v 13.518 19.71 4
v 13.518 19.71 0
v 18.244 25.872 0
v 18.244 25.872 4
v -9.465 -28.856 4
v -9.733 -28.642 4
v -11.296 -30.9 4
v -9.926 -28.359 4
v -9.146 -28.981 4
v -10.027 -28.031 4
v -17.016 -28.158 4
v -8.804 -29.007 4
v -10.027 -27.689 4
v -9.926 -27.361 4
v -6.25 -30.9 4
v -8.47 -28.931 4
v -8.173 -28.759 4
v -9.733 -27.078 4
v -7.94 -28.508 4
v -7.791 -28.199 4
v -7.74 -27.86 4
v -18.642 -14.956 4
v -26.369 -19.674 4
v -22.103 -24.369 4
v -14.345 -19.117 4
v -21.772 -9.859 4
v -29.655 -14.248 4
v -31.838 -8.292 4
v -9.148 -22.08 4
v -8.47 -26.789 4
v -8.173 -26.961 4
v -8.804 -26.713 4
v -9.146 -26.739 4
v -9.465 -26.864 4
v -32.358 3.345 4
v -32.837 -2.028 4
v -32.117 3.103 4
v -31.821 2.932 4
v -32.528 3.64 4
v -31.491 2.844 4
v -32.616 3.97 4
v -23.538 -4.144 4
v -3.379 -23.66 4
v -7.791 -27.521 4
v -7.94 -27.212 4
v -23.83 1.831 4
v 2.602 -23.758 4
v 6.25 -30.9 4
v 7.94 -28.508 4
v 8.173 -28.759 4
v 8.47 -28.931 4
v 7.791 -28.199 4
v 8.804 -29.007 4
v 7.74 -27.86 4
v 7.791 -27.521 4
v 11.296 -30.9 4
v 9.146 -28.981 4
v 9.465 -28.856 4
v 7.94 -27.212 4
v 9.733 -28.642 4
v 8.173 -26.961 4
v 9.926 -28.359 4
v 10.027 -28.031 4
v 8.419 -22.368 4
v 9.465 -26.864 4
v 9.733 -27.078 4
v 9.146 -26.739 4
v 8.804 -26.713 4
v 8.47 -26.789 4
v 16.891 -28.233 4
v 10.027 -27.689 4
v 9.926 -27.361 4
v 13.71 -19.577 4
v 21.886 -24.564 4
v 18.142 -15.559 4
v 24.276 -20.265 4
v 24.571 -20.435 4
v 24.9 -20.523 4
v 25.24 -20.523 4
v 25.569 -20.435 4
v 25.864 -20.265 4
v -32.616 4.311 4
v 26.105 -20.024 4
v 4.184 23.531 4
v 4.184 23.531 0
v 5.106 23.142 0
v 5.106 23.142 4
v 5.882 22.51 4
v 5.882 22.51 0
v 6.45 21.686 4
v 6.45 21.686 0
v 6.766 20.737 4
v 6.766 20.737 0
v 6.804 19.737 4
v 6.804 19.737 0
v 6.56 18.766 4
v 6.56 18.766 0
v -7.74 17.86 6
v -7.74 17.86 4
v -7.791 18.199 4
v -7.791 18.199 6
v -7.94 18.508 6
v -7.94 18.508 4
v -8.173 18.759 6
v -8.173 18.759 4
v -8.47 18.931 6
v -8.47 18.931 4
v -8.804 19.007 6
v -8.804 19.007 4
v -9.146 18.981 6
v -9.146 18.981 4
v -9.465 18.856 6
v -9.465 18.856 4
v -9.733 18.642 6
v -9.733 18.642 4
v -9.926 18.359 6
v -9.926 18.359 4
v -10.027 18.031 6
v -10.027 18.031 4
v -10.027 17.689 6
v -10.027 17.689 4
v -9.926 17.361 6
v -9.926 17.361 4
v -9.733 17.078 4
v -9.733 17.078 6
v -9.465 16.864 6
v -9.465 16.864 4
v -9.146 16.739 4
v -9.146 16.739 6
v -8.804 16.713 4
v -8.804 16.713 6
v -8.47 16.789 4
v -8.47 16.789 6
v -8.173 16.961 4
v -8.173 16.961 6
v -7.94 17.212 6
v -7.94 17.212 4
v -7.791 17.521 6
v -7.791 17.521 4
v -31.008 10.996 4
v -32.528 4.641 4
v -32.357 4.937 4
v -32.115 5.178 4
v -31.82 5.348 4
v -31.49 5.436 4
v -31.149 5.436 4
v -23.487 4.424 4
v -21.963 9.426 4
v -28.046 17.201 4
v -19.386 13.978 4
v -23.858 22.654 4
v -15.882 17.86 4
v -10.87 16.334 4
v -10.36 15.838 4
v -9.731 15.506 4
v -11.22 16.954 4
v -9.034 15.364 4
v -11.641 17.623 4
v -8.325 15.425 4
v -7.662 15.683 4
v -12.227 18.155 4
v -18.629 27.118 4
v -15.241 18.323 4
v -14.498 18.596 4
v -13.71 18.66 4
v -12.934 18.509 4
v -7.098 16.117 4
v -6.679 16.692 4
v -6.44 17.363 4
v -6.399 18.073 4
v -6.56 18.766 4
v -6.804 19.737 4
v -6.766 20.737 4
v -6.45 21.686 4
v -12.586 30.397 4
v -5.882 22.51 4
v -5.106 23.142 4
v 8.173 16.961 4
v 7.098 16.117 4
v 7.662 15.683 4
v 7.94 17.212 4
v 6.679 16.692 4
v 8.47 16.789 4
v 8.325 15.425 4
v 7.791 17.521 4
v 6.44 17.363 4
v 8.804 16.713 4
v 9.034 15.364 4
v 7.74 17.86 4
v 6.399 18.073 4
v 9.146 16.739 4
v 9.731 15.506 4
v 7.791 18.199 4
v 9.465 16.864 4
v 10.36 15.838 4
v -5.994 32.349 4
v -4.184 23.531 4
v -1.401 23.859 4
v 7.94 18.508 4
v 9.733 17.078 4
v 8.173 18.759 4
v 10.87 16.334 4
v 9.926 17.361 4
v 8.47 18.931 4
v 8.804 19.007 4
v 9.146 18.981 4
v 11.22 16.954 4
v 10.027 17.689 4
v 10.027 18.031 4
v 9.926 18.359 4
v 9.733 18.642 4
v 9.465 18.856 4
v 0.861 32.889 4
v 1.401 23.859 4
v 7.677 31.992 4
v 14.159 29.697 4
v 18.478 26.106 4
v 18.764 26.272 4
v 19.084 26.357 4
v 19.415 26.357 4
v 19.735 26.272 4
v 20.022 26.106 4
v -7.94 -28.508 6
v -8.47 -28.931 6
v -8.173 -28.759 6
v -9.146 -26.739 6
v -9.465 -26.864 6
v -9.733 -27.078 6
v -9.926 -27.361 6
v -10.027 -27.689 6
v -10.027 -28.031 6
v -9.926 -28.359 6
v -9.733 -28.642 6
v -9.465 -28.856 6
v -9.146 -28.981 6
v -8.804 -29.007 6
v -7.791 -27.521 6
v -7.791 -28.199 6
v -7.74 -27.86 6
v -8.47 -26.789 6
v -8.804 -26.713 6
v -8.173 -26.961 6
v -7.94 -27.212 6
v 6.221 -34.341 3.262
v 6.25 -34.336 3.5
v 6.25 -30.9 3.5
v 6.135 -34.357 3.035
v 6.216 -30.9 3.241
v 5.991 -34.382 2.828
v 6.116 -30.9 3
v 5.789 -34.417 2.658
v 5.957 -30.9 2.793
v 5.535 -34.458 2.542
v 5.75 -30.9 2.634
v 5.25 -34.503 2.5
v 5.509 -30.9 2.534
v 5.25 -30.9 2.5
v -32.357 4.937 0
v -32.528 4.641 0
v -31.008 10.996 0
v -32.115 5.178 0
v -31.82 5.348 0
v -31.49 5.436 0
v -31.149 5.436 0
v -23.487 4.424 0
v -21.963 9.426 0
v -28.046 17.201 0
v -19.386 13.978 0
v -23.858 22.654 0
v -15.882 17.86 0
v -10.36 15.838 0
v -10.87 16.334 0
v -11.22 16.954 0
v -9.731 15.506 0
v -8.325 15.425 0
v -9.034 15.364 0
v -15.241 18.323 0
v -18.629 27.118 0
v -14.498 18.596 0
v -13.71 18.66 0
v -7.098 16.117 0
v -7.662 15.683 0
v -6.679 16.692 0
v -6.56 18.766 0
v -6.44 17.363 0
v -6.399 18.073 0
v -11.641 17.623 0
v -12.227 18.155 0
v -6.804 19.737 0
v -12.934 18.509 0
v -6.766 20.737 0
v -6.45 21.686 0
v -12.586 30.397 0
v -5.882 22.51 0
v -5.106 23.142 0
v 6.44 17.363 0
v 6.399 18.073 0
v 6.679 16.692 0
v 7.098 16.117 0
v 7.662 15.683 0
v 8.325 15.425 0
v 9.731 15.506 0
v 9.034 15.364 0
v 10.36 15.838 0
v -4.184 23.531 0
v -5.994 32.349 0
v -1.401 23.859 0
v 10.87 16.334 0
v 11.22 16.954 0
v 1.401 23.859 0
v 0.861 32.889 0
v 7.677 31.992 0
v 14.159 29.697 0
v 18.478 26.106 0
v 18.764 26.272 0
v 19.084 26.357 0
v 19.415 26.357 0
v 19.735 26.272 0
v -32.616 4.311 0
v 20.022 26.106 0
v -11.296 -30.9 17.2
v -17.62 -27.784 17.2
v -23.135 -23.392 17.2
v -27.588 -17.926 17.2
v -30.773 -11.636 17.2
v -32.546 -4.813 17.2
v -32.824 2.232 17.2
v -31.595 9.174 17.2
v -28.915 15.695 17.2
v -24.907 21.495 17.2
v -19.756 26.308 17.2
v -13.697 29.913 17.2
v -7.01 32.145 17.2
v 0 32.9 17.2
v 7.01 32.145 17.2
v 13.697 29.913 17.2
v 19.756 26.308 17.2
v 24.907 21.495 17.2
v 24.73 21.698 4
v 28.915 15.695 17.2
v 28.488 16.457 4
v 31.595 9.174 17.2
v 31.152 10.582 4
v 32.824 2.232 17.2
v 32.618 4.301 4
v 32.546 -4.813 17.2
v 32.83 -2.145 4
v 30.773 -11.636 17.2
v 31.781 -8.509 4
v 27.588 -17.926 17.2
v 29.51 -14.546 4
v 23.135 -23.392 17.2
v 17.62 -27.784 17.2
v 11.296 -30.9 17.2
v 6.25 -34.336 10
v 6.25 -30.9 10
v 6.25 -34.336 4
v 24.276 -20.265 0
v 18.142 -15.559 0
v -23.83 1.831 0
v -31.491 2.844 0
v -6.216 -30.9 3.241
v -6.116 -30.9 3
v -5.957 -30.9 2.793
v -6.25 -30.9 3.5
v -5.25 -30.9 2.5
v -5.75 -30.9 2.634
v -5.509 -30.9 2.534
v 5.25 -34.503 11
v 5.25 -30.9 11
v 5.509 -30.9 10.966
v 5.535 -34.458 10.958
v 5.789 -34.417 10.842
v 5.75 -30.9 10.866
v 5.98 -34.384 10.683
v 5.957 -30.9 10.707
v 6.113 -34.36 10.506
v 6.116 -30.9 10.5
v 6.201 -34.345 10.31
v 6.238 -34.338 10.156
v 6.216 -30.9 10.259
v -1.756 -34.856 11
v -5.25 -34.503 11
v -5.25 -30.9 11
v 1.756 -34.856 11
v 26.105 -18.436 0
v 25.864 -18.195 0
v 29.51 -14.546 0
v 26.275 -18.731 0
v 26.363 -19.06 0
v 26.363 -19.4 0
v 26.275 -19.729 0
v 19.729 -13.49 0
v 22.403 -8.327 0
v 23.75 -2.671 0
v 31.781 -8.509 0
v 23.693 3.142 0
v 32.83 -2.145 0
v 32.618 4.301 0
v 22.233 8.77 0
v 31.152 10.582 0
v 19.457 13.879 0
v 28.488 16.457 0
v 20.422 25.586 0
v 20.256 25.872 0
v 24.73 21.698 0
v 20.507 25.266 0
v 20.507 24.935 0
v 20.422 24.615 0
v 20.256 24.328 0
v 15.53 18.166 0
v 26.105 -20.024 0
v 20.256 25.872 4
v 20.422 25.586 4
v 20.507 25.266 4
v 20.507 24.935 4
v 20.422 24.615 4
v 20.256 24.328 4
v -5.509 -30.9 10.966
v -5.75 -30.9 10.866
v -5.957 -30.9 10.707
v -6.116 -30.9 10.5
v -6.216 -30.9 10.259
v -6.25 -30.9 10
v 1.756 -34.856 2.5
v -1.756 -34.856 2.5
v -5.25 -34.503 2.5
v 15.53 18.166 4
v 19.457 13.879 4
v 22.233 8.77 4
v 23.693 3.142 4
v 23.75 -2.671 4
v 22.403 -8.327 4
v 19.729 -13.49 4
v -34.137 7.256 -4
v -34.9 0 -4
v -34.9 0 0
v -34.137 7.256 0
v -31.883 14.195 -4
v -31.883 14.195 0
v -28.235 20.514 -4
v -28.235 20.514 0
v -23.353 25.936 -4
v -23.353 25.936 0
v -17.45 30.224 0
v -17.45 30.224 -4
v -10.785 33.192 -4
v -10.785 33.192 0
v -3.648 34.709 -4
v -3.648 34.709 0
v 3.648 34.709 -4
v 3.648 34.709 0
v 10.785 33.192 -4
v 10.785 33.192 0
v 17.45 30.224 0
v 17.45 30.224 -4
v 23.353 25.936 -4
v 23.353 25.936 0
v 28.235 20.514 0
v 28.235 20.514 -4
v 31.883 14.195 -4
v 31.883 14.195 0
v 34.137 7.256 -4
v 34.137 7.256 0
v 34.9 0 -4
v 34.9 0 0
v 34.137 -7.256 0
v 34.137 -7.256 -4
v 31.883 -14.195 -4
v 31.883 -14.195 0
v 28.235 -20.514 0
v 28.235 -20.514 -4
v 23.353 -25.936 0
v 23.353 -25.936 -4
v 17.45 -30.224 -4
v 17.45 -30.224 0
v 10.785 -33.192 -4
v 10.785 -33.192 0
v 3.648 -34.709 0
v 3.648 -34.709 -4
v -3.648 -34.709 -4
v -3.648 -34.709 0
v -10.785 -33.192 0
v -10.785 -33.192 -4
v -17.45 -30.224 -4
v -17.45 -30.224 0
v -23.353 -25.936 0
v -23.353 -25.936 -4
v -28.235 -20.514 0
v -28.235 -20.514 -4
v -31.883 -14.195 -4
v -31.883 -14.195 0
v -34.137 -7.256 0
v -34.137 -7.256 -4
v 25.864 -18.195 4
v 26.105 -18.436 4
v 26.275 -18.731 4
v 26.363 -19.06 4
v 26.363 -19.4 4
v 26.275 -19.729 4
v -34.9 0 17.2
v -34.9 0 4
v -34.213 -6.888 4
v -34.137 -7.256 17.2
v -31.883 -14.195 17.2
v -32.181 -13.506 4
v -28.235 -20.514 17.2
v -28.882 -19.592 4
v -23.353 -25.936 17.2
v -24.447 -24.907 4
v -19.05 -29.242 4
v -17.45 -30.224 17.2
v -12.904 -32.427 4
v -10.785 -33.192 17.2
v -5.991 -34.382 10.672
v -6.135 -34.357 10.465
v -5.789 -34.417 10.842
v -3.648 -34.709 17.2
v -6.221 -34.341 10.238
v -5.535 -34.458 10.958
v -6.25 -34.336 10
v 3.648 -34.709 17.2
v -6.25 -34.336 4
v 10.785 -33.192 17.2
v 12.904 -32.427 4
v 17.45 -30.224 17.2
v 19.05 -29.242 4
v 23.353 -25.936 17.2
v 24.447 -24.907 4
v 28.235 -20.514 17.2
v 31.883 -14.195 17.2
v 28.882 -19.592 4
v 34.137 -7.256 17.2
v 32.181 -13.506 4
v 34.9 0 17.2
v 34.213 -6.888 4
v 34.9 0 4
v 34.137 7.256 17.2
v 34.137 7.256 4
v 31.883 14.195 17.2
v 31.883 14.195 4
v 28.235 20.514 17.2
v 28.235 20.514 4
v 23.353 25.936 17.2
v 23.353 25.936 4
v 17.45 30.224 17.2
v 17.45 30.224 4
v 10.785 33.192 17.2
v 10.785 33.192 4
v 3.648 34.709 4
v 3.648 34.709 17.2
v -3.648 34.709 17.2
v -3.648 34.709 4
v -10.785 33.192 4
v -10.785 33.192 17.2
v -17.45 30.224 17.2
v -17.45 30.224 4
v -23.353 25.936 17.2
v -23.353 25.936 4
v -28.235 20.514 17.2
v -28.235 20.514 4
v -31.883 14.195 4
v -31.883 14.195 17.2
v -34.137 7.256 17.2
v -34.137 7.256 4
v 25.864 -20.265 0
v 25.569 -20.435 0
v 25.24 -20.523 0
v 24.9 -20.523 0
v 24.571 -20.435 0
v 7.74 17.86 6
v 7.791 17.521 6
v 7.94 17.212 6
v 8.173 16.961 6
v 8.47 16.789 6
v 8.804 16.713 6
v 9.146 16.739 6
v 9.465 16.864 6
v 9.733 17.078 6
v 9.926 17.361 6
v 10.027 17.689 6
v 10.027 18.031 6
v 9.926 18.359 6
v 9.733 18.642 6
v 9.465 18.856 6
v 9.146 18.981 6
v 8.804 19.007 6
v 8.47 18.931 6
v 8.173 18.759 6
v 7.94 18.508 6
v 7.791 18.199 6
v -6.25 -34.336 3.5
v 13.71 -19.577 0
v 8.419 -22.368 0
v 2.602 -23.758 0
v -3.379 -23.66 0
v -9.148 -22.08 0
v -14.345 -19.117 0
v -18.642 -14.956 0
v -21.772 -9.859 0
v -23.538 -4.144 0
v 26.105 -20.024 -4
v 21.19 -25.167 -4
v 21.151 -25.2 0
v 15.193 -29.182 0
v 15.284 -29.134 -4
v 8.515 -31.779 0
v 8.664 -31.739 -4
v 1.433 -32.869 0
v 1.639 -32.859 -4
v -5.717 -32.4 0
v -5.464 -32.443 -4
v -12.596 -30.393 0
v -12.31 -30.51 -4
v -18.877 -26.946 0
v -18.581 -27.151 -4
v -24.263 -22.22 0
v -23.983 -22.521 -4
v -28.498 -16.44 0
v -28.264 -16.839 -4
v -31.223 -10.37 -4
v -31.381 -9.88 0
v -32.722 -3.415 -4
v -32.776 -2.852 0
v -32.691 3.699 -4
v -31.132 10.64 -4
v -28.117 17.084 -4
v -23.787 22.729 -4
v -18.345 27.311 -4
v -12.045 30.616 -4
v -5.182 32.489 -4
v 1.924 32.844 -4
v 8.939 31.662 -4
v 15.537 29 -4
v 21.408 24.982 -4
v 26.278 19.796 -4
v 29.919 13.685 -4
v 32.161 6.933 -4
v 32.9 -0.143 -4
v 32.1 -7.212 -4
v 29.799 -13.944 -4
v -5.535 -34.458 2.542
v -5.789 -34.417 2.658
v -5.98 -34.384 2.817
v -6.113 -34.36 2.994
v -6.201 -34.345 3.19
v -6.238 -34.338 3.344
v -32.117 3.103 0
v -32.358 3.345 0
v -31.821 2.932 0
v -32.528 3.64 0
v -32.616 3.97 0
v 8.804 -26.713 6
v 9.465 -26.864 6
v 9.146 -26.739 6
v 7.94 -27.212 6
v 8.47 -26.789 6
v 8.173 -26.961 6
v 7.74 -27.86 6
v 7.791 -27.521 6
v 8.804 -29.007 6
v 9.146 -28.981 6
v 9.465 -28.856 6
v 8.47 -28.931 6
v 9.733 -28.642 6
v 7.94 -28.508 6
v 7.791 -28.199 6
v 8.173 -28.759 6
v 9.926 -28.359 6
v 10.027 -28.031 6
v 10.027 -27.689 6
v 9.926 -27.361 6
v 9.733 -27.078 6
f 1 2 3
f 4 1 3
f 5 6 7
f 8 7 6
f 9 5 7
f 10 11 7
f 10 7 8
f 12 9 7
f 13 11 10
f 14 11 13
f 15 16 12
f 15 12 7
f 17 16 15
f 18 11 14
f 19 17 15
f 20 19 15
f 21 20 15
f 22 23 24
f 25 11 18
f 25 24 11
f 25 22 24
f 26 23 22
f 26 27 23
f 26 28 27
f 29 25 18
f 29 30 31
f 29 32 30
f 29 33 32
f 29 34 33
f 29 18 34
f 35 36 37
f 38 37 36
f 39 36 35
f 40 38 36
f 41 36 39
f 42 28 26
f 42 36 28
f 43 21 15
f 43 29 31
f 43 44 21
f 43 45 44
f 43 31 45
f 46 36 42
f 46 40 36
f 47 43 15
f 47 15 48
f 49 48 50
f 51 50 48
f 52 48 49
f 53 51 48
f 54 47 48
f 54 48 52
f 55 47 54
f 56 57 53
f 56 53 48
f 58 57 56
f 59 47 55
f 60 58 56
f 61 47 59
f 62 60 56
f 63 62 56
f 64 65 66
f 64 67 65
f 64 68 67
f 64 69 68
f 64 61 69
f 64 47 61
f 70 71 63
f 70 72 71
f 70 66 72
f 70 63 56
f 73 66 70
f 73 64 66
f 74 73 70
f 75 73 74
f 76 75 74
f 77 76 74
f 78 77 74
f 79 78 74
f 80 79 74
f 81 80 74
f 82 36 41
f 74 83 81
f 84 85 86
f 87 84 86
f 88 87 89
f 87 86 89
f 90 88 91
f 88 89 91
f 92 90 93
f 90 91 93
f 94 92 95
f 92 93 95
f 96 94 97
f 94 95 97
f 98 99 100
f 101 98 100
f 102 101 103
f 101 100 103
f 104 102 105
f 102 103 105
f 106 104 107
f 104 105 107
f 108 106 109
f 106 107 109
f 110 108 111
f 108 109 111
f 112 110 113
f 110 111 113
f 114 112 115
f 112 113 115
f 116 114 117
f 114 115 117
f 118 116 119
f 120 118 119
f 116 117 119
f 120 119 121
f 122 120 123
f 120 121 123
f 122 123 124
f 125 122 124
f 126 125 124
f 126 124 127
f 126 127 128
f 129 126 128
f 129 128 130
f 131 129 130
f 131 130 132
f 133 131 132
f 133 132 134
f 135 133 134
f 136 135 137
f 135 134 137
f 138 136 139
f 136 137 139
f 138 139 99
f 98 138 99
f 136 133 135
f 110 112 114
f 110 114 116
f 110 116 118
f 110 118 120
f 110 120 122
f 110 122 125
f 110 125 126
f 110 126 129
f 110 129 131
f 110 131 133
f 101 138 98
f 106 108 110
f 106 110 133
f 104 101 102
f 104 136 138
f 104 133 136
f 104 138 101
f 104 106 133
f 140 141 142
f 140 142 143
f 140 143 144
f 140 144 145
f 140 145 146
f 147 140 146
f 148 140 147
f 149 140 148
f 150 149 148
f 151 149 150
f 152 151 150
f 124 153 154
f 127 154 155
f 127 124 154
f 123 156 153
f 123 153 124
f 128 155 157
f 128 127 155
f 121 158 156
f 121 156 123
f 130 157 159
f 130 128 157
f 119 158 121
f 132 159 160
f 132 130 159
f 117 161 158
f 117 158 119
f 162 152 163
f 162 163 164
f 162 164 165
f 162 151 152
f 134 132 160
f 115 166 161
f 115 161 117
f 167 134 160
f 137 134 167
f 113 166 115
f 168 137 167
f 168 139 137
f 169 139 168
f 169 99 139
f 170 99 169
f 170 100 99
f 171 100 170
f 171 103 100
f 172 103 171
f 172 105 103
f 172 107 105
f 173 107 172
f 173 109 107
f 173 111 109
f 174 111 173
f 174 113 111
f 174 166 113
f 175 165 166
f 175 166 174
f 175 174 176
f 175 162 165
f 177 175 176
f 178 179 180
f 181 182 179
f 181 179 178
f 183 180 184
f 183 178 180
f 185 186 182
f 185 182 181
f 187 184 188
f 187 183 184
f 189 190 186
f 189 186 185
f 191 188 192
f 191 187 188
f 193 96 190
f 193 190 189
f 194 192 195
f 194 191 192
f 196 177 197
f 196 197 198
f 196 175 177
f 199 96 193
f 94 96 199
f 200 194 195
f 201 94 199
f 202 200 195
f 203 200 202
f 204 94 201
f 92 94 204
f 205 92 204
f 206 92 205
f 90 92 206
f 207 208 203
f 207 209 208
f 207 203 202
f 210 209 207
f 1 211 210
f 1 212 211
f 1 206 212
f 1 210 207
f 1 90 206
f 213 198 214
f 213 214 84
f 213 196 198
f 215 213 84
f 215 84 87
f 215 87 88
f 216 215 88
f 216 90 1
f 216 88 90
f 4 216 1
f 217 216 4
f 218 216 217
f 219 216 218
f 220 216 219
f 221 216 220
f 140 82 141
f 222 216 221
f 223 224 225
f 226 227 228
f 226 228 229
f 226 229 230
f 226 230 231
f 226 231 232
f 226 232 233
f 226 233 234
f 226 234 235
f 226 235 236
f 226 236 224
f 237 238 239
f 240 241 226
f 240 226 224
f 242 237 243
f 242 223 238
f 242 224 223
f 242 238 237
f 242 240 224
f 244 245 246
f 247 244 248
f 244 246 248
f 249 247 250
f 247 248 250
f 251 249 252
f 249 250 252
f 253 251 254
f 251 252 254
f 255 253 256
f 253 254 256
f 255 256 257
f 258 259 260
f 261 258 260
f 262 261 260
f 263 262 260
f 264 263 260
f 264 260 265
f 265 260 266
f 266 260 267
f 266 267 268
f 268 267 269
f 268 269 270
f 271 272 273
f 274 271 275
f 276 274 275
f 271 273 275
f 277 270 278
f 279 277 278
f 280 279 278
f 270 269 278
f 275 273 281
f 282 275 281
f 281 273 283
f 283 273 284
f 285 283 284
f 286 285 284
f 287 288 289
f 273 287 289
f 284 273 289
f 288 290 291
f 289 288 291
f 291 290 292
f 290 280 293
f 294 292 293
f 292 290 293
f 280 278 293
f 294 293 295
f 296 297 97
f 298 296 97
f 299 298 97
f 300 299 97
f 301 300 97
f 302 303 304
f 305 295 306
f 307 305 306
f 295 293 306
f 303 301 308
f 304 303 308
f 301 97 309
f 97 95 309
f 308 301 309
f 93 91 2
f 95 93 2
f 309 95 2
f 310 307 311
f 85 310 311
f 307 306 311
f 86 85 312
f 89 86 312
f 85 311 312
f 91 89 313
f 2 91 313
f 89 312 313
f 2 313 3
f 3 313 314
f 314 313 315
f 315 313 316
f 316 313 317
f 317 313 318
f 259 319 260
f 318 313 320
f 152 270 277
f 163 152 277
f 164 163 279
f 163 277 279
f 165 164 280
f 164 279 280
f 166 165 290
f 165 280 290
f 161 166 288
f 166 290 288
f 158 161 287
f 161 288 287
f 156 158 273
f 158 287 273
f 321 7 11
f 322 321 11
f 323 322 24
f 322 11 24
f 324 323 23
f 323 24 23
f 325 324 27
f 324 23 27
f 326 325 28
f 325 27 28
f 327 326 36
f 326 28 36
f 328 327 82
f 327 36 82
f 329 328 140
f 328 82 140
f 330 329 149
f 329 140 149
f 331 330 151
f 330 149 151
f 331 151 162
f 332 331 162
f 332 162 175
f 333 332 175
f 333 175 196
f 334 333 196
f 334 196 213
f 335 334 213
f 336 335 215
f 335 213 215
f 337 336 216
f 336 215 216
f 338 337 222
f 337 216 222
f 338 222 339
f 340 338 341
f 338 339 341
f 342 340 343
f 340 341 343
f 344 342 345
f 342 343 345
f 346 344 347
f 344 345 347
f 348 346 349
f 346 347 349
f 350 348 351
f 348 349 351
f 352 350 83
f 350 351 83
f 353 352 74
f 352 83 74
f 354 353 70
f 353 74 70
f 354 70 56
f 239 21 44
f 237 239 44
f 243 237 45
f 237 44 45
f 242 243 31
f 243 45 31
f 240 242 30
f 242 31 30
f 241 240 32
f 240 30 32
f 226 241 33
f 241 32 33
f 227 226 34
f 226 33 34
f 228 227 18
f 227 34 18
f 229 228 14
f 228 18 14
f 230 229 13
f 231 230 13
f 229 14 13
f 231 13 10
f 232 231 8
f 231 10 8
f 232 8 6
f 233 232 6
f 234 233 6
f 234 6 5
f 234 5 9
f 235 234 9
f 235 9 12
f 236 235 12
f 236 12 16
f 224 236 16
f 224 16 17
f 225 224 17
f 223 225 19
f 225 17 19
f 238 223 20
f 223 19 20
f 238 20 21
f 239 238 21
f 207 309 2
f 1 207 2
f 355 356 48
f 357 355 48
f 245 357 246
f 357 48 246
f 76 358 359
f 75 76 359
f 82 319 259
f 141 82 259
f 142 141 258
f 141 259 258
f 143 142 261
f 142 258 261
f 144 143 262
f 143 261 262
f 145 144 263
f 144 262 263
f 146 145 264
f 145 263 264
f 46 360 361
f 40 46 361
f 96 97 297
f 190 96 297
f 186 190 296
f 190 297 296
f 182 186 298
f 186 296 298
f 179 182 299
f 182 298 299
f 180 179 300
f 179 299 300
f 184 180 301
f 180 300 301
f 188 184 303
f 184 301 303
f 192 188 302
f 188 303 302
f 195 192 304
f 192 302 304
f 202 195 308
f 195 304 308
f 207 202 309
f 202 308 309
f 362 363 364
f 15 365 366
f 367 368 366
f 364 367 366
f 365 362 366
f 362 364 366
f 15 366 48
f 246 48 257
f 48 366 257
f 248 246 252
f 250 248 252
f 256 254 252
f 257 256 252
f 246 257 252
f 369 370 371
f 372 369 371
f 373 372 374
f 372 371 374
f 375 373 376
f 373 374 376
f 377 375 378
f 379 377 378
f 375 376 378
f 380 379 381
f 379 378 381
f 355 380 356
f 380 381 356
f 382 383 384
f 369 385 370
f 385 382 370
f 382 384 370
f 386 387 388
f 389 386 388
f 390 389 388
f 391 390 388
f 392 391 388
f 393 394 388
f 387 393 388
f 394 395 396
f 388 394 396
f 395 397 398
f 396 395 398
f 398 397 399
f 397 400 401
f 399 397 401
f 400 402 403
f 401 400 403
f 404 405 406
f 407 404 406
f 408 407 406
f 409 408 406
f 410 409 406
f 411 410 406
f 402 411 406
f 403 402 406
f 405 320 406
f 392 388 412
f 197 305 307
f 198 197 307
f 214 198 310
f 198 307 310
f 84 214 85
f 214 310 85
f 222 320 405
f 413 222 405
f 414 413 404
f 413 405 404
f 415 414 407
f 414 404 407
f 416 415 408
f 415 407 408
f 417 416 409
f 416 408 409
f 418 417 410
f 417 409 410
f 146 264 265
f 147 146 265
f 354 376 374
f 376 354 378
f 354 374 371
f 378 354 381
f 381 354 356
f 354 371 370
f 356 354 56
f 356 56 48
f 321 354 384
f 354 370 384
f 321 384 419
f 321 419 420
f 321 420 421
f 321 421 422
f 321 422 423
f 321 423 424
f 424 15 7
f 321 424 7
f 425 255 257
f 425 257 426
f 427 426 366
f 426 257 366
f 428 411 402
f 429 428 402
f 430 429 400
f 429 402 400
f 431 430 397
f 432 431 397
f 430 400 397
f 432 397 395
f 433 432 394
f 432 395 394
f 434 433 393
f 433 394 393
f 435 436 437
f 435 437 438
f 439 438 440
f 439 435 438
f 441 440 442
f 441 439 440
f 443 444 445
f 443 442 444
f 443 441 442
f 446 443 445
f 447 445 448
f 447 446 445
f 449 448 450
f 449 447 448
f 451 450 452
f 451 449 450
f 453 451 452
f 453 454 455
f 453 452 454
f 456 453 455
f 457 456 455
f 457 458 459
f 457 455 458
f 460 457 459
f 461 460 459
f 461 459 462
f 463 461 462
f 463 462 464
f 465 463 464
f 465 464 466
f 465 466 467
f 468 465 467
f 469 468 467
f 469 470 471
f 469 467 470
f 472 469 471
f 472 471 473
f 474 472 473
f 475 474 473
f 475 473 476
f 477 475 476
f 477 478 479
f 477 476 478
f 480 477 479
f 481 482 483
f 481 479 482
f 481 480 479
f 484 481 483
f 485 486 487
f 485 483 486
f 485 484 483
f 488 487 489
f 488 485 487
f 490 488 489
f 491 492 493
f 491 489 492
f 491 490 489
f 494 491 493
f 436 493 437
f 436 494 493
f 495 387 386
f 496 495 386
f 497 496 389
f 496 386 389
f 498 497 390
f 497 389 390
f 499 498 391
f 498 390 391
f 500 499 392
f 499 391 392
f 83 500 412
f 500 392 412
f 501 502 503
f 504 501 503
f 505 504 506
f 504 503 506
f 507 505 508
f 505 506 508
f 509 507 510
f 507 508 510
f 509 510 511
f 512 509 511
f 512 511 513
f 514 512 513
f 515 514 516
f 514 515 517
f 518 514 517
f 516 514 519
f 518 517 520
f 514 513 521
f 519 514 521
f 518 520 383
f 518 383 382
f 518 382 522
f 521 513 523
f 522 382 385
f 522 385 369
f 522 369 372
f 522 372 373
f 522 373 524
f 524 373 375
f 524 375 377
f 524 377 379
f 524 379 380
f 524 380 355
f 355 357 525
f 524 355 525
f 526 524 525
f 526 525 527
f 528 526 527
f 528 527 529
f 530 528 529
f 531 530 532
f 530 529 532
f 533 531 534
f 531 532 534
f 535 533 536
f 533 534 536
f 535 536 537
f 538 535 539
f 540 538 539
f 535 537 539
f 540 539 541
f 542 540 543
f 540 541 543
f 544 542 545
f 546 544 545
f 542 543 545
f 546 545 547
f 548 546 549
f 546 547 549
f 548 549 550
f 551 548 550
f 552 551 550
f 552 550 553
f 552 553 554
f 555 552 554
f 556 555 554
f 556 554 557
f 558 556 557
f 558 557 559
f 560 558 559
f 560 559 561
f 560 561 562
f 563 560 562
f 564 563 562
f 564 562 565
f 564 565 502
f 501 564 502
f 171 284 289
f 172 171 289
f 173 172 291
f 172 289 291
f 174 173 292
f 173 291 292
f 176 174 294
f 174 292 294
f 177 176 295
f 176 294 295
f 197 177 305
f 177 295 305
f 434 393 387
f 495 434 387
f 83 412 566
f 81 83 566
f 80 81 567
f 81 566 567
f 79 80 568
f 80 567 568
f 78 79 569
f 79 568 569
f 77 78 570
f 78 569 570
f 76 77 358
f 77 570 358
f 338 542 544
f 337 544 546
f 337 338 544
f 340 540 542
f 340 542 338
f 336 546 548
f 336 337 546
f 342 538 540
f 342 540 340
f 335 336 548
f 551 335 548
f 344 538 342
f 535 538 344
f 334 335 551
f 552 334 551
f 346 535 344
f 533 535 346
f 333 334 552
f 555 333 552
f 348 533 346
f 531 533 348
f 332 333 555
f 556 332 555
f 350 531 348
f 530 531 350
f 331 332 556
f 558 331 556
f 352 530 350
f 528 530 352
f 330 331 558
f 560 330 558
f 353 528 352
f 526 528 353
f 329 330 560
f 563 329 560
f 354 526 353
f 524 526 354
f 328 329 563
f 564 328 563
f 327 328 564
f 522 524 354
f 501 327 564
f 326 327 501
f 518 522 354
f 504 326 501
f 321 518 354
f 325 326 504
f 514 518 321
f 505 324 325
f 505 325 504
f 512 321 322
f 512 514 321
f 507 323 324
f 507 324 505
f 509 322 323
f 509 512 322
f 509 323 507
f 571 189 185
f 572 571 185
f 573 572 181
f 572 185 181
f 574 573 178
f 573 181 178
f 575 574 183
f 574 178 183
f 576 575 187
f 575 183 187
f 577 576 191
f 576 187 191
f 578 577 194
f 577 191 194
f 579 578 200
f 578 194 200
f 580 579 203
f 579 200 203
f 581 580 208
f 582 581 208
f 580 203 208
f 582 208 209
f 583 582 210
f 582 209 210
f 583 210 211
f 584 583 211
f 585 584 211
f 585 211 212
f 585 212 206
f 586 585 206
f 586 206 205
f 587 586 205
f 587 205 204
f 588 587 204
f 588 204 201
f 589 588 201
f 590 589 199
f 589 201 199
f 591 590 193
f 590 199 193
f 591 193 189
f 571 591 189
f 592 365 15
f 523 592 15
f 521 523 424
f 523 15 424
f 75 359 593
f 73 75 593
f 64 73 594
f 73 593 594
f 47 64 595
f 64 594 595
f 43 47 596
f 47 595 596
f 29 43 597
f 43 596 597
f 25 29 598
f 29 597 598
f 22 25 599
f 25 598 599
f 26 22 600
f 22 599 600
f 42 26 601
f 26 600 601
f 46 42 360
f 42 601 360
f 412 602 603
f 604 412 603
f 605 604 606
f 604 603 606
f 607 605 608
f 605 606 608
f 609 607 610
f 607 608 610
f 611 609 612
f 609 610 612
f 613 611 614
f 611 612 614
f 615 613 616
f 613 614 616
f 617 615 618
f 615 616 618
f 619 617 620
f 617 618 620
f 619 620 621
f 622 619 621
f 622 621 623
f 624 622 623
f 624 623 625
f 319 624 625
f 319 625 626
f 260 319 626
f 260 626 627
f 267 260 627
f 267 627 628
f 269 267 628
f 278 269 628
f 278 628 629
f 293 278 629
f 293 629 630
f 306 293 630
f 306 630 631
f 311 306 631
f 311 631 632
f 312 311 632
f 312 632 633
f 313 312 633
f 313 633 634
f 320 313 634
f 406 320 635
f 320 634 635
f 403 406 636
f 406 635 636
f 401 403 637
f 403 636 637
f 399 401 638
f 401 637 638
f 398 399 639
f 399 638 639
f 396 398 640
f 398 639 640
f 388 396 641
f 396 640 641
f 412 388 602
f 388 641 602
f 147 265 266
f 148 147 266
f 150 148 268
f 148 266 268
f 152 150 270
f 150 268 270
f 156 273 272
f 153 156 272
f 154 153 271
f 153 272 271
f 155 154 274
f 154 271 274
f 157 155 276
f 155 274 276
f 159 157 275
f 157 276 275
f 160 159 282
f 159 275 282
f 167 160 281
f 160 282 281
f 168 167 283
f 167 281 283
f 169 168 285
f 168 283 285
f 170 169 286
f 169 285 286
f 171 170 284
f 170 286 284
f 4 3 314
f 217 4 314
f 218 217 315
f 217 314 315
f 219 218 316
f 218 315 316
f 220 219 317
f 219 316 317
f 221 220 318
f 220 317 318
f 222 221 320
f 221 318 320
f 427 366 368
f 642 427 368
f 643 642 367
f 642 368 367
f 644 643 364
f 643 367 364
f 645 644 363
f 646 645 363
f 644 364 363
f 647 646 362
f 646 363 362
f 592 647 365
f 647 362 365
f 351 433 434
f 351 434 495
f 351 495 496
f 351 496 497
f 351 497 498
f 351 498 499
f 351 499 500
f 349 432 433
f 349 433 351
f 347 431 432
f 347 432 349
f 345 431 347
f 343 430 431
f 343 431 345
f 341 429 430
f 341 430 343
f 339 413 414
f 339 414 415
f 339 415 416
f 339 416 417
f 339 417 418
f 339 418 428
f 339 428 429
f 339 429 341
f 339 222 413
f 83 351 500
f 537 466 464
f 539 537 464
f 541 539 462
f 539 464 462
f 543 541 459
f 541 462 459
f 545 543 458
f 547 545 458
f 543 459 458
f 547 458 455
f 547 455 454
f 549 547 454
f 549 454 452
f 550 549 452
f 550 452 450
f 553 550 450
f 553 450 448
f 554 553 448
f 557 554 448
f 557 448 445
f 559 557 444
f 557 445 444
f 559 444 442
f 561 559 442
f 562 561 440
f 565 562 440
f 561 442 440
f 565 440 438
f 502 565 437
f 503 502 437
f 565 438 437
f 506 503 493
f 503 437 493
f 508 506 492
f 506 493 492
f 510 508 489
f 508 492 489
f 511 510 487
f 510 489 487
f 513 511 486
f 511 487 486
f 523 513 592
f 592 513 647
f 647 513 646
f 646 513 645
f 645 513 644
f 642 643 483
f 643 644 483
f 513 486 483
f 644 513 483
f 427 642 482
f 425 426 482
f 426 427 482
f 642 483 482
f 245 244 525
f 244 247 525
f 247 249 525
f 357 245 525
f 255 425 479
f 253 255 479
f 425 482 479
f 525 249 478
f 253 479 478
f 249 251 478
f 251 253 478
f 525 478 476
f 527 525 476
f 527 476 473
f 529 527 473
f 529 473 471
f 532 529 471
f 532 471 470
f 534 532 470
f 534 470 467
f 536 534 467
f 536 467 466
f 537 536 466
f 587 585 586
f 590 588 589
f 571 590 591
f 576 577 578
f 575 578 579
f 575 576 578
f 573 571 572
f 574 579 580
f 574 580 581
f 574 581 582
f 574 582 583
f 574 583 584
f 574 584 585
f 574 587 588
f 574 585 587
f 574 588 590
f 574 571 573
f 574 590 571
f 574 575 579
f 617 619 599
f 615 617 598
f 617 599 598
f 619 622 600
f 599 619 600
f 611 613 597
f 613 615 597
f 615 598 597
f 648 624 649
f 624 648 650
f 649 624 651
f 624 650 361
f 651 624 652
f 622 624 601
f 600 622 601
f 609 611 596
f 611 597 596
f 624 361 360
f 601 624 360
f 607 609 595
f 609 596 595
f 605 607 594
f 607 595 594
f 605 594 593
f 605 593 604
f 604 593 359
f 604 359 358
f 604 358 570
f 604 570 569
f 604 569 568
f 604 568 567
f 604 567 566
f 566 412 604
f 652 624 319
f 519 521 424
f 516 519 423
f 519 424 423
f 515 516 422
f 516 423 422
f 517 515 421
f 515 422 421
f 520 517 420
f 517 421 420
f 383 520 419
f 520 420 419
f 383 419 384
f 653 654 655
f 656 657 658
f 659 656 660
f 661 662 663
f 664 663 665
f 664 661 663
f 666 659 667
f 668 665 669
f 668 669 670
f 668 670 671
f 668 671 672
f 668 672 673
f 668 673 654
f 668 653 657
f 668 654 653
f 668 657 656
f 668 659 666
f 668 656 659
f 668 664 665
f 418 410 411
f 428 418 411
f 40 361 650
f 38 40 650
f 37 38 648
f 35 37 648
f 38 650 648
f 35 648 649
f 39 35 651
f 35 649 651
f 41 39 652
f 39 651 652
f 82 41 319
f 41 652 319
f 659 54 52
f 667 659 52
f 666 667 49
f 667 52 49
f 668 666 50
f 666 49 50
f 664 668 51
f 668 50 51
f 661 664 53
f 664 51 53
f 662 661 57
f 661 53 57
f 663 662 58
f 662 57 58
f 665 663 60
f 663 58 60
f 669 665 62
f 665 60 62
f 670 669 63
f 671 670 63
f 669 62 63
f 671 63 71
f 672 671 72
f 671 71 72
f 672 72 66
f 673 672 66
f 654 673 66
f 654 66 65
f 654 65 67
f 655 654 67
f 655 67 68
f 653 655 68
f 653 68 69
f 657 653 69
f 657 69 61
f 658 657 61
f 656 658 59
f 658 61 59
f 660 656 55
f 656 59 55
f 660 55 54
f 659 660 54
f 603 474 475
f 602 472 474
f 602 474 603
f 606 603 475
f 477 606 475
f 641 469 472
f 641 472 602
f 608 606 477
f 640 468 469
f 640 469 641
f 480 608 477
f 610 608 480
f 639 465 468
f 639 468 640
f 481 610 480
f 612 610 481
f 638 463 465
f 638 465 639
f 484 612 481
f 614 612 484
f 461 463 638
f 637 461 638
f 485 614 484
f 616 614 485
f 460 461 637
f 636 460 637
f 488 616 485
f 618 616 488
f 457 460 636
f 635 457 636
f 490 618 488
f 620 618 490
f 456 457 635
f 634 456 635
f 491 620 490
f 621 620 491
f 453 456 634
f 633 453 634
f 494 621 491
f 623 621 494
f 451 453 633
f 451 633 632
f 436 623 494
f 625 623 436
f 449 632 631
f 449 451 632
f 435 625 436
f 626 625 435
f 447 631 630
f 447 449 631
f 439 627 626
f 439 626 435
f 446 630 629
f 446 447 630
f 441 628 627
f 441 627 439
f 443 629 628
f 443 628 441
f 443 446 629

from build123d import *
from build123d.topology import SkipClean

# Parameters (mm, degrees)
ESQUISSE_SUPPORT_R      = 34.9
BOSS_EXTRU_1_DEPTH      = 4
ESQUISSE6_R             = 1.15
BOSS_EXTRU_2_DEPTH      = 2
BOSS_EXTRU_3_START      = 4
ESQUISSE7_R             = 34.9
ESQUISSE7_R_2           = 32.9
BOSS_EXTRU_3_DEPTH      = 4
ESQUISSE8_R             = 34.9
BOSS_EXTRU_5_DEPTH      = 13.2
ENL_V_MAT_EXTRU_1_DEPTH = 10


with BuildPart() as part:
    # Esquisse_support → Boss.-Extru.1 (new body)
    with BuildSketch(Plane.XY):
        Circle(ESQUISSE_SUPPORT_R)
        with BuildLine():
            ThreePointArc((-6.559988321, 18.766115653), (-6.450497051, 21.686422251), (-4.183806862, 23.530953235))
            ThreePointArc((-4.183806862, 23.530953235), (0, 23.9), (4.183806862, 23.530953235))
            ThreePointArc((4.183806862, 23.530953235), (6.450497051, 21.686422251), (6.559988321, 18.766115653))
            ThreePointArc((6.559988321, 18.766115653), (7.983884347, 15.529988321), (11.220011679, 16.953884347))
            Line((11.220011679, 16.953884347), (13.517895322, 19.709807357))
            Line((13.517895322, 19.709807357), (18.243699169, 25.871764581))
            ThreePointArc((18.243699169, 25.871764581), (19.084157828, 26.35728211), (20.021764581, 26.106300831))
            ThreePointArc((20.021764581, 26.106300831), (20.50728211, 25.265842172), (20.256300831, 24.328235419))
            Line((20.256300831, 24.328235419), (15.530496983, 18.166278195))
            ThreePointArc((15.530496983, 18.166278195), (23.692512492, 3.142427693), (19.729143793, -13.489658454))
            Line((19.729143793, -13.489658454), (25.863736665, -18.195211742))
            ThreePointArc((25.863736665, -18.195211742), (26.362962372, -19.059550784), (26.104788258, -20.023736665))
            ThreePointArc((26.104788258, -20.023736665), (25.240449216, -20.522962372), (24.276263335, -20.264788258))
            Line((24.276263335, -20.264788258), (18.141670463, -15.559234969))
            ThreePointArc((18.141670463, -15.559234969), (-9.148411266, -22.079777429), (-23.829761597, 1.830973023))
            Line((-23.829761597, 1.830973023), (-31.491348477, 2.843711519))
            ThreePointArc((-31.491348477, 2.843711519), (-32.357776046, 3.344547295), (-32.616288481, 4.311348477))
            ThreePointArc((-32.616288481, 4.311348477), (-32.115452705, 5.177776046), (-31.148651523, 5.436288481))
            Line((-31.148651523, 5.436288481), (-23.487064643, 4.423549986))
            ThreePointArc((-23.487064643, 4.423549986), (-20.799295594, 11.772820511), (-15.881763126, 17.86))
            ThreePointArc((-15.881763126, 17.86), (-13.316845537, 18.611032405), (-11.220011679, 16.953884347))
            ThreePointArc((-11.220011679, 16.953884347), (-7.983884347, 15.529988321), (-6.559988321, 18.766115653))
        make_face(mode=Mode.SUBTRACT)
    extrude(amount=BOSS_EXTRU_1_DEPTH)

    # Esquisse6 → Boss.-Extru.2 (add)
    with BuildSketch(Plane.XY.offset(4)):
        with Locations((-8.89, 17.86)):
            Circle(ESQUISSE6_R)
        with Locations((-8.89, -27.86)):
            Circle(ESQUISSE6_R)
        with Locations(Location((8.89, -27.86, 0), (0, 0, 180))):
            Circle(ESQUISSE6_R)
        with Locations(Location((8.89, 17.86, 0), (0, 0, 180))):
            Circle(ESQUISSE6_R)
    extrude(amount=BOSS_EXTRU_2_DEPTH)

    # Esquisse7 → Boss.-Extru.3 (add)
    with BuildSketch(Plane(origin=(0, 0, 0), x_dir=(-1, 0, 0), z_dir=(0, 0, -1)).offset(BOSS_EXTRU_3_START)):
        Circle(ESQUISSE7_R)
        with Locations(Location((0, 0, 0), (0, 0, 217.490091077))):
            Circle(ESQUISSE7_R_2, mode=Mode.SUBTRACT)
    extrude(amount=-BOSS_EXTRU_3_DEPTH)

    # Esquisse8 → Boss.-Extru.5 (add)
    with BuildSketch(Plane.XY.offset(4)):
        with Locations(Location((0, 0, 0), (0, 0, 180))):
            Circle(ESQUISSE8_R)
        with BuildLine():
            ThreePointArc((-11.296016997, -30.9), (0, 32.9), (11.296016997, -30.9))
            Line((11.296016997, -30.9), (-11.296016997, -30.9))
        make_face(mode=Mode.SUBTRACT)
    extrude(amount=BOSS_EXTRU_5_DEPTH)

    # Ouverture_USB → Enlèv. mat.-Extru.1 (cut)
    with SkipClean():  # the faces are left unmerged after this step: merging them gives an invalid solid
        with BuildSketch(Plane(origin=(0, -30.9, 0), x_dir=(1, 0, 0), z_dir=(0, 1, 0))):
            with BuildLine():
                Line((-5.25, -11), (5.25, -11))
                ThreePointArc((5.25, -11), (5.957106781, -10.707106781), (6.25, -10))
                Line((6.25, -10), (6.25, -3.5))
                ThreePointArc((6.25, -3.5), (5.957106781, -2.792893219), (5.25, -2.5))
                Line((5.25, -2.5), (-5.25, -2.5))
                ThreePointArc((-5.25, -2.5), (-5.957106781, -2.792893219), (-6.25, -3.5))
                Line((-6.25, -3.5), (-6.25, -10))
                ThreePointArc((-6.25, -10), (-5.957106781, -10.707106781), (-5.25, -11))
            make_face()
        extrude(amount=-ENL_V_MAT_EXTRU_1_DEPTH, mode=Mode.SUBTRACT)


solid = part.part
